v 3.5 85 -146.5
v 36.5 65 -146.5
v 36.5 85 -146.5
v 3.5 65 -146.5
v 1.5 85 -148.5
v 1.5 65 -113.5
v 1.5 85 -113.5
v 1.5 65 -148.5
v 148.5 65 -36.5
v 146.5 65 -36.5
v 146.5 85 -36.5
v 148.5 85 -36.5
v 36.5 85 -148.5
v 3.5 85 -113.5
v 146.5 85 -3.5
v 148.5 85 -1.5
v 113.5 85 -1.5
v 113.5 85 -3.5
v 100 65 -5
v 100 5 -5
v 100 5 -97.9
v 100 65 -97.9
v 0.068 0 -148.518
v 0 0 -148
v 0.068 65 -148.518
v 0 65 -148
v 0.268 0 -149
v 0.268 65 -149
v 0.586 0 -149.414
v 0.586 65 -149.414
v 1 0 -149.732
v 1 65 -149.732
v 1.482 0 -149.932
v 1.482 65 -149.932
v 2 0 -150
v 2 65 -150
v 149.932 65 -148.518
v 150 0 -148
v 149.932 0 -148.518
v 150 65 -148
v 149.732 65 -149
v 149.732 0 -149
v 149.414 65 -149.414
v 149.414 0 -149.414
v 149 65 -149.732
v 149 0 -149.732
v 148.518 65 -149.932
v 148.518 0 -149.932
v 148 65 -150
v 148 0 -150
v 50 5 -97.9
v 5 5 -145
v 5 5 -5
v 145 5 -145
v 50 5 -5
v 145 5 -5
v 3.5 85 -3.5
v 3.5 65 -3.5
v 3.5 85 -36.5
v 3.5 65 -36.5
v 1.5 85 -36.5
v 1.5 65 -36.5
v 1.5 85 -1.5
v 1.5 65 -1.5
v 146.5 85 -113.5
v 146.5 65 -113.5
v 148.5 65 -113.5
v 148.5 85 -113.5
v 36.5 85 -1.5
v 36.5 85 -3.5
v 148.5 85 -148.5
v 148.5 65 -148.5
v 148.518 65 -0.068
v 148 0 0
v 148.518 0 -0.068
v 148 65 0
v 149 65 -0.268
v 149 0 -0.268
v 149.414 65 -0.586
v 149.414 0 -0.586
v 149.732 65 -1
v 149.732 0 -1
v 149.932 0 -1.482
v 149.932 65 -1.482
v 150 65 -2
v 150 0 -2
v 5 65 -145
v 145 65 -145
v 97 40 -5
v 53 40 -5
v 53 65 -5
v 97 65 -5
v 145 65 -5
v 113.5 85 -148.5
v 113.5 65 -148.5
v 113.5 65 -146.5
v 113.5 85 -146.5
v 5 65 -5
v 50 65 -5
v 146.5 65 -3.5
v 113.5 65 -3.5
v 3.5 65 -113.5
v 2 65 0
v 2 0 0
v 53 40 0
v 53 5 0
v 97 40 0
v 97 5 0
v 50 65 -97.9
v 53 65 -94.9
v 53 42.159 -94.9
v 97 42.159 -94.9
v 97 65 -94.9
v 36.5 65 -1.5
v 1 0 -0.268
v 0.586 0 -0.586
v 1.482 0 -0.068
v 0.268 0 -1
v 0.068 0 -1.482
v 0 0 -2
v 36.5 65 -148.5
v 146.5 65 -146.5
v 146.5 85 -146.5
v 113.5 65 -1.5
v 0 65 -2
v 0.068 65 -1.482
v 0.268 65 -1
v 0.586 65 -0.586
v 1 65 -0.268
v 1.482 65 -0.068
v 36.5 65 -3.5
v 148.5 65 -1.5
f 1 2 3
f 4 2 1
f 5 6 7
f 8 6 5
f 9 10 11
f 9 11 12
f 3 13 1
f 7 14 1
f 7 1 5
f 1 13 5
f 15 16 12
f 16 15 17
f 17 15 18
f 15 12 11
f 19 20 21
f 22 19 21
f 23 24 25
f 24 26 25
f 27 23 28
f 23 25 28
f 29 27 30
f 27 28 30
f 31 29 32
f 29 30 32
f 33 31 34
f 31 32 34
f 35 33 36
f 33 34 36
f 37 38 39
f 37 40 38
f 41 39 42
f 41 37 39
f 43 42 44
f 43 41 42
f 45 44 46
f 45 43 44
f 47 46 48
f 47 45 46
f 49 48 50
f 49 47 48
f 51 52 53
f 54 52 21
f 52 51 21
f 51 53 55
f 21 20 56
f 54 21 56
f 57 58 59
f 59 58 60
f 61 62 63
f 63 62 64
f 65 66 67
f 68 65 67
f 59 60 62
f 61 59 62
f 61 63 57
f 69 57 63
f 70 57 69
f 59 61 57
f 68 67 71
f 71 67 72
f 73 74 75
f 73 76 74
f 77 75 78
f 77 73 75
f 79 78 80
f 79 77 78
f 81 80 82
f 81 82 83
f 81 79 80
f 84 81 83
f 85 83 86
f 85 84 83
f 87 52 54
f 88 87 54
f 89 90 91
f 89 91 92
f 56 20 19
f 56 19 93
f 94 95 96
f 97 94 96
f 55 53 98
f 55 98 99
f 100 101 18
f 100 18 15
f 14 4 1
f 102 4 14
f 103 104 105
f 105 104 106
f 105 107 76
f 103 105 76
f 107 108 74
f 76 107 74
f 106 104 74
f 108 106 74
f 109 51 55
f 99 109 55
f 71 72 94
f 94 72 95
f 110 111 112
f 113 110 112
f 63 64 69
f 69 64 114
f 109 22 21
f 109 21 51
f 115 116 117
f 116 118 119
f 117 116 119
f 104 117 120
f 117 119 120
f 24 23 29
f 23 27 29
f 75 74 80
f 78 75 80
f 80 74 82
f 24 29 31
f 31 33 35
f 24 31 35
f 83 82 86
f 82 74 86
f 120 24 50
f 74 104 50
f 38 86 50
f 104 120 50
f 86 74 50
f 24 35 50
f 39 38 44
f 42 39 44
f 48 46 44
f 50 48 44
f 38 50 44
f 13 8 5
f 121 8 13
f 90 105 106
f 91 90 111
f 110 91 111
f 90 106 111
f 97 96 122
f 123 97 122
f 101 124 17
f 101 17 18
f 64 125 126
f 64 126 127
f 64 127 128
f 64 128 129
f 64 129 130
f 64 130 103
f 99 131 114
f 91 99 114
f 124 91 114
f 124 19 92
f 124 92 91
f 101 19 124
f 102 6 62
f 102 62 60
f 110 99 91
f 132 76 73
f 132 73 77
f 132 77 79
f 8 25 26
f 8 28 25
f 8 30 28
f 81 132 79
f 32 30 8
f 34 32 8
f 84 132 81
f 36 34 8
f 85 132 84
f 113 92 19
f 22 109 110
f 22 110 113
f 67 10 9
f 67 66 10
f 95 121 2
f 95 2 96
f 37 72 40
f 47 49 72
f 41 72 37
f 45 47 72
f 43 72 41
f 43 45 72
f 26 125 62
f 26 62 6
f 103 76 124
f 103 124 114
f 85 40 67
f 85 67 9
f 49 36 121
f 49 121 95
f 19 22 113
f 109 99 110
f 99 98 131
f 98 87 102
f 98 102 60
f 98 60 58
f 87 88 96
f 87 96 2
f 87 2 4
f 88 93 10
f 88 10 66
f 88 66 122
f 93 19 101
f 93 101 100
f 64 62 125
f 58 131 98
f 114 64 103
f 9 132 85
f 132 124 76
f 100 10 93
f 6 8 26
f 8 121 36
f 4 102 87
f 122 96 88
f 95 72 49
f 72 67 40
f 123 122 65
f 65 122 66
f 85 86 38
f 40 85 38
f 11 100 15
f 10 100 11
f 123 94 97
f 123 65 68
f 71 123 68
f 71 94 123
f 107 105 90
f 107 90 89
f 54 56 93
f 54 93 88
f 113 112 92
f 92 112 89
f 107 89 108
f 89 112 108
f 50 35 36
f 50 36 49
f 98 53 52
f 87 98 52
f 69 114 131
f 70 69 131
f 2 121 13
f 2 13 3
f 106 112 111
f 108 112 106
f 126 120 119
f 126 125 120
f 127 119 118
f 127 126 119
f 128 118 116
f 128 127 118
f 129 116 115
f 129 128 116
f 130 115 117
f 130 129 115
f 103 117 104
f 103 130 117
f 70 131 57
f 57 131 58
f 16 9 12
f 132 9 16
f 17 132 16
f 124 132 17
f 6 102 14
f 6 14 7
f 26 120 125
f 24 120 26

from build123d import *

# Parameters (mm, degrees)
SKETCH1_W                       = 150
SKETCH1_H                       = 150
BOSS_EXTRUDE1_DEPTH             = 65
SHELL1_T                        = -5
FILLET1_R                       = 2
BOSS_EXTRUDE2_DEPTH             = 20
CUT_EXTRUDE1_REACH              = 230.528
SKETCH3_W                       = 44
SKETCH3_H                       = 35
BOSS_EXTRUDE3_DEPTH             = 60
BOSS_EXTRUDE4_REACH             = 190.016
BOSS_EXTRUDE4_DIRECTION_2_REACH = 190.016


with BuildPart() as part:
    # Sketch1 → Boss-Extrude1 (new body)
    with BuildSketch(Plane(origin=(0, 0, 0), x_dir=(1, 0, 0), z_dir=(0, 1, 0))):
        with Locations((75, 75)):
            Rectangle(SKETCH1_W, SKETCH1_H)
    extrude(amount=BOSS_EXTRUDE1_DEPTH)

    # Shell1
    shell1_openings = [part.faces().sort_by_distance(p)[0] for p in [
        (75, 65, -75),
    ]]
    offset(amount=SHELL1_T, openings=shell1_openings, kind=Kind.INTERSECTION)

    # Fillet1
    fillet1_edges = [part.edges().sort_by_distance(p)[0] for p in [
        (0, 32.5, -150),
        (150, 32.5, -150),
        (150, 32.5, 0),
        (0, 32.5, 0),
    ]]
    fillet(fillet1_edges, radius=FILLET1_R)

    # Sketch2 → Boss-Extrude2 (add)
    with BuildSketch(Plane(origin=(0, 65, 0), x_dir=(1, 0, 0), z_dir=(0, 1, 0))):
        Polygon((1.5, 113.5), (1.5, 148.5), (36.5, 148.5), (36.5, 146.5), (3.5, 146.5), (3.5, 113.5), align=None)
        Polygon((148.5, 113.5), (148.5, 148.5), (113.5, 148.5), (113.5, 146.5), (146.5, 146.5), (146.5, 113.5), align=None)
        Polygon((148.5, 36.5), (148.5, 1.5), (113.5, 1.5), (113.5, 3.5), (146.5, 3.5), (146.5, 36.5), align=None)
        Polygon((1.5, 36.5), (1.5, 1.5), (36.5, 1.5), (36.5, 3.5), (3.5, 3.5), (3.5, 36.5), align=None)
    extrude(amount=BOSS_EXTRUDE2_DEPTH)

    # Sketch3 → Cut-Extrude1 (cut, up to next)
    with BuildSketch(Plane.XY, mode=Mode.PRIVATE) as cut_extrude1_sk1:
        with Locations((75, 22.5)):
            Rectangle(SKETCH3_W, SKETCH3_H)
    cut_extrude1_tool1 = extrude(cut_extrude1_sk1.sketch, amount=-CUT_EXTRUDE1_REACH, mode=Mode.PRIVATE) & part.part
    add(cut_extrude1_tool1.solids().sort_by_distance((75, 22.5, 0))[0], mode=Mode.SUBTRACT)

    # Sketch4 → Boss-Extrude3 (add)
    with BuildSketch(Plane(origin=(0, 5, 0), x_dir=(1, 0, 0), z_dir=(0, 1, 0))):
        Polygon((53, 5), (53, 94.9), (97, 94.9), (97, 5), (100, 5), (100, 97.9), (50, 97.9), (50, 5), align=None)
    extrude(amount=BOSS_EXTRUDE3_DEPTH)

    # Sketch7 → Boss-Extrude4 (add, up to next)
    with BuildSketch(Plane(origin=(75, 0, 0), x_dir=(0, 0, -1), z_dir=(1, 0, 0)), mode=Mode.PRIVATE) as boss_extrude4_sk1:
        Polygon((94.9, 42.158643577), (0, 5), (94.9, 5), align=None)
    boss_extrude4_tool1 = extrude(boss_extrude4_sk1.sketch, amount=BOSS_EXTRUDE4_REACH, mode=Mode.PRIVATE) - part.part
    add(boss_extrude4_tool1.solids().sort_by_distance((75, 17.386215, -63.266667))[0])

    # Sketch7 → Boss-Extrude4 direction 2 (add, up to next)
    with BuildSketch(Plane(origin=(75, 0, 0), x_dir=(0, 0, -1), z_dir=(1, 0, 0)), mode=Mode.PRIVATE) as boss_extrude4_direction_2_sk1:
        Polygon((94.9, 42.158643577), (0, 5), (94.9, 5), align=None)
    boss_extrude4_direction_2_tool1 = extrude(boss_extrude4_direction_2_sk1.sketch, amount=-BOSS_EXTRUDE4_DIRECTION_2_REACH, mode=Mode.PRIVATE) - part.part
    add(boss_extrude4_direction_2_tool1.solids().sort_by_distance((75, 17.386215, -63.266667))[0])


solid = part.part
